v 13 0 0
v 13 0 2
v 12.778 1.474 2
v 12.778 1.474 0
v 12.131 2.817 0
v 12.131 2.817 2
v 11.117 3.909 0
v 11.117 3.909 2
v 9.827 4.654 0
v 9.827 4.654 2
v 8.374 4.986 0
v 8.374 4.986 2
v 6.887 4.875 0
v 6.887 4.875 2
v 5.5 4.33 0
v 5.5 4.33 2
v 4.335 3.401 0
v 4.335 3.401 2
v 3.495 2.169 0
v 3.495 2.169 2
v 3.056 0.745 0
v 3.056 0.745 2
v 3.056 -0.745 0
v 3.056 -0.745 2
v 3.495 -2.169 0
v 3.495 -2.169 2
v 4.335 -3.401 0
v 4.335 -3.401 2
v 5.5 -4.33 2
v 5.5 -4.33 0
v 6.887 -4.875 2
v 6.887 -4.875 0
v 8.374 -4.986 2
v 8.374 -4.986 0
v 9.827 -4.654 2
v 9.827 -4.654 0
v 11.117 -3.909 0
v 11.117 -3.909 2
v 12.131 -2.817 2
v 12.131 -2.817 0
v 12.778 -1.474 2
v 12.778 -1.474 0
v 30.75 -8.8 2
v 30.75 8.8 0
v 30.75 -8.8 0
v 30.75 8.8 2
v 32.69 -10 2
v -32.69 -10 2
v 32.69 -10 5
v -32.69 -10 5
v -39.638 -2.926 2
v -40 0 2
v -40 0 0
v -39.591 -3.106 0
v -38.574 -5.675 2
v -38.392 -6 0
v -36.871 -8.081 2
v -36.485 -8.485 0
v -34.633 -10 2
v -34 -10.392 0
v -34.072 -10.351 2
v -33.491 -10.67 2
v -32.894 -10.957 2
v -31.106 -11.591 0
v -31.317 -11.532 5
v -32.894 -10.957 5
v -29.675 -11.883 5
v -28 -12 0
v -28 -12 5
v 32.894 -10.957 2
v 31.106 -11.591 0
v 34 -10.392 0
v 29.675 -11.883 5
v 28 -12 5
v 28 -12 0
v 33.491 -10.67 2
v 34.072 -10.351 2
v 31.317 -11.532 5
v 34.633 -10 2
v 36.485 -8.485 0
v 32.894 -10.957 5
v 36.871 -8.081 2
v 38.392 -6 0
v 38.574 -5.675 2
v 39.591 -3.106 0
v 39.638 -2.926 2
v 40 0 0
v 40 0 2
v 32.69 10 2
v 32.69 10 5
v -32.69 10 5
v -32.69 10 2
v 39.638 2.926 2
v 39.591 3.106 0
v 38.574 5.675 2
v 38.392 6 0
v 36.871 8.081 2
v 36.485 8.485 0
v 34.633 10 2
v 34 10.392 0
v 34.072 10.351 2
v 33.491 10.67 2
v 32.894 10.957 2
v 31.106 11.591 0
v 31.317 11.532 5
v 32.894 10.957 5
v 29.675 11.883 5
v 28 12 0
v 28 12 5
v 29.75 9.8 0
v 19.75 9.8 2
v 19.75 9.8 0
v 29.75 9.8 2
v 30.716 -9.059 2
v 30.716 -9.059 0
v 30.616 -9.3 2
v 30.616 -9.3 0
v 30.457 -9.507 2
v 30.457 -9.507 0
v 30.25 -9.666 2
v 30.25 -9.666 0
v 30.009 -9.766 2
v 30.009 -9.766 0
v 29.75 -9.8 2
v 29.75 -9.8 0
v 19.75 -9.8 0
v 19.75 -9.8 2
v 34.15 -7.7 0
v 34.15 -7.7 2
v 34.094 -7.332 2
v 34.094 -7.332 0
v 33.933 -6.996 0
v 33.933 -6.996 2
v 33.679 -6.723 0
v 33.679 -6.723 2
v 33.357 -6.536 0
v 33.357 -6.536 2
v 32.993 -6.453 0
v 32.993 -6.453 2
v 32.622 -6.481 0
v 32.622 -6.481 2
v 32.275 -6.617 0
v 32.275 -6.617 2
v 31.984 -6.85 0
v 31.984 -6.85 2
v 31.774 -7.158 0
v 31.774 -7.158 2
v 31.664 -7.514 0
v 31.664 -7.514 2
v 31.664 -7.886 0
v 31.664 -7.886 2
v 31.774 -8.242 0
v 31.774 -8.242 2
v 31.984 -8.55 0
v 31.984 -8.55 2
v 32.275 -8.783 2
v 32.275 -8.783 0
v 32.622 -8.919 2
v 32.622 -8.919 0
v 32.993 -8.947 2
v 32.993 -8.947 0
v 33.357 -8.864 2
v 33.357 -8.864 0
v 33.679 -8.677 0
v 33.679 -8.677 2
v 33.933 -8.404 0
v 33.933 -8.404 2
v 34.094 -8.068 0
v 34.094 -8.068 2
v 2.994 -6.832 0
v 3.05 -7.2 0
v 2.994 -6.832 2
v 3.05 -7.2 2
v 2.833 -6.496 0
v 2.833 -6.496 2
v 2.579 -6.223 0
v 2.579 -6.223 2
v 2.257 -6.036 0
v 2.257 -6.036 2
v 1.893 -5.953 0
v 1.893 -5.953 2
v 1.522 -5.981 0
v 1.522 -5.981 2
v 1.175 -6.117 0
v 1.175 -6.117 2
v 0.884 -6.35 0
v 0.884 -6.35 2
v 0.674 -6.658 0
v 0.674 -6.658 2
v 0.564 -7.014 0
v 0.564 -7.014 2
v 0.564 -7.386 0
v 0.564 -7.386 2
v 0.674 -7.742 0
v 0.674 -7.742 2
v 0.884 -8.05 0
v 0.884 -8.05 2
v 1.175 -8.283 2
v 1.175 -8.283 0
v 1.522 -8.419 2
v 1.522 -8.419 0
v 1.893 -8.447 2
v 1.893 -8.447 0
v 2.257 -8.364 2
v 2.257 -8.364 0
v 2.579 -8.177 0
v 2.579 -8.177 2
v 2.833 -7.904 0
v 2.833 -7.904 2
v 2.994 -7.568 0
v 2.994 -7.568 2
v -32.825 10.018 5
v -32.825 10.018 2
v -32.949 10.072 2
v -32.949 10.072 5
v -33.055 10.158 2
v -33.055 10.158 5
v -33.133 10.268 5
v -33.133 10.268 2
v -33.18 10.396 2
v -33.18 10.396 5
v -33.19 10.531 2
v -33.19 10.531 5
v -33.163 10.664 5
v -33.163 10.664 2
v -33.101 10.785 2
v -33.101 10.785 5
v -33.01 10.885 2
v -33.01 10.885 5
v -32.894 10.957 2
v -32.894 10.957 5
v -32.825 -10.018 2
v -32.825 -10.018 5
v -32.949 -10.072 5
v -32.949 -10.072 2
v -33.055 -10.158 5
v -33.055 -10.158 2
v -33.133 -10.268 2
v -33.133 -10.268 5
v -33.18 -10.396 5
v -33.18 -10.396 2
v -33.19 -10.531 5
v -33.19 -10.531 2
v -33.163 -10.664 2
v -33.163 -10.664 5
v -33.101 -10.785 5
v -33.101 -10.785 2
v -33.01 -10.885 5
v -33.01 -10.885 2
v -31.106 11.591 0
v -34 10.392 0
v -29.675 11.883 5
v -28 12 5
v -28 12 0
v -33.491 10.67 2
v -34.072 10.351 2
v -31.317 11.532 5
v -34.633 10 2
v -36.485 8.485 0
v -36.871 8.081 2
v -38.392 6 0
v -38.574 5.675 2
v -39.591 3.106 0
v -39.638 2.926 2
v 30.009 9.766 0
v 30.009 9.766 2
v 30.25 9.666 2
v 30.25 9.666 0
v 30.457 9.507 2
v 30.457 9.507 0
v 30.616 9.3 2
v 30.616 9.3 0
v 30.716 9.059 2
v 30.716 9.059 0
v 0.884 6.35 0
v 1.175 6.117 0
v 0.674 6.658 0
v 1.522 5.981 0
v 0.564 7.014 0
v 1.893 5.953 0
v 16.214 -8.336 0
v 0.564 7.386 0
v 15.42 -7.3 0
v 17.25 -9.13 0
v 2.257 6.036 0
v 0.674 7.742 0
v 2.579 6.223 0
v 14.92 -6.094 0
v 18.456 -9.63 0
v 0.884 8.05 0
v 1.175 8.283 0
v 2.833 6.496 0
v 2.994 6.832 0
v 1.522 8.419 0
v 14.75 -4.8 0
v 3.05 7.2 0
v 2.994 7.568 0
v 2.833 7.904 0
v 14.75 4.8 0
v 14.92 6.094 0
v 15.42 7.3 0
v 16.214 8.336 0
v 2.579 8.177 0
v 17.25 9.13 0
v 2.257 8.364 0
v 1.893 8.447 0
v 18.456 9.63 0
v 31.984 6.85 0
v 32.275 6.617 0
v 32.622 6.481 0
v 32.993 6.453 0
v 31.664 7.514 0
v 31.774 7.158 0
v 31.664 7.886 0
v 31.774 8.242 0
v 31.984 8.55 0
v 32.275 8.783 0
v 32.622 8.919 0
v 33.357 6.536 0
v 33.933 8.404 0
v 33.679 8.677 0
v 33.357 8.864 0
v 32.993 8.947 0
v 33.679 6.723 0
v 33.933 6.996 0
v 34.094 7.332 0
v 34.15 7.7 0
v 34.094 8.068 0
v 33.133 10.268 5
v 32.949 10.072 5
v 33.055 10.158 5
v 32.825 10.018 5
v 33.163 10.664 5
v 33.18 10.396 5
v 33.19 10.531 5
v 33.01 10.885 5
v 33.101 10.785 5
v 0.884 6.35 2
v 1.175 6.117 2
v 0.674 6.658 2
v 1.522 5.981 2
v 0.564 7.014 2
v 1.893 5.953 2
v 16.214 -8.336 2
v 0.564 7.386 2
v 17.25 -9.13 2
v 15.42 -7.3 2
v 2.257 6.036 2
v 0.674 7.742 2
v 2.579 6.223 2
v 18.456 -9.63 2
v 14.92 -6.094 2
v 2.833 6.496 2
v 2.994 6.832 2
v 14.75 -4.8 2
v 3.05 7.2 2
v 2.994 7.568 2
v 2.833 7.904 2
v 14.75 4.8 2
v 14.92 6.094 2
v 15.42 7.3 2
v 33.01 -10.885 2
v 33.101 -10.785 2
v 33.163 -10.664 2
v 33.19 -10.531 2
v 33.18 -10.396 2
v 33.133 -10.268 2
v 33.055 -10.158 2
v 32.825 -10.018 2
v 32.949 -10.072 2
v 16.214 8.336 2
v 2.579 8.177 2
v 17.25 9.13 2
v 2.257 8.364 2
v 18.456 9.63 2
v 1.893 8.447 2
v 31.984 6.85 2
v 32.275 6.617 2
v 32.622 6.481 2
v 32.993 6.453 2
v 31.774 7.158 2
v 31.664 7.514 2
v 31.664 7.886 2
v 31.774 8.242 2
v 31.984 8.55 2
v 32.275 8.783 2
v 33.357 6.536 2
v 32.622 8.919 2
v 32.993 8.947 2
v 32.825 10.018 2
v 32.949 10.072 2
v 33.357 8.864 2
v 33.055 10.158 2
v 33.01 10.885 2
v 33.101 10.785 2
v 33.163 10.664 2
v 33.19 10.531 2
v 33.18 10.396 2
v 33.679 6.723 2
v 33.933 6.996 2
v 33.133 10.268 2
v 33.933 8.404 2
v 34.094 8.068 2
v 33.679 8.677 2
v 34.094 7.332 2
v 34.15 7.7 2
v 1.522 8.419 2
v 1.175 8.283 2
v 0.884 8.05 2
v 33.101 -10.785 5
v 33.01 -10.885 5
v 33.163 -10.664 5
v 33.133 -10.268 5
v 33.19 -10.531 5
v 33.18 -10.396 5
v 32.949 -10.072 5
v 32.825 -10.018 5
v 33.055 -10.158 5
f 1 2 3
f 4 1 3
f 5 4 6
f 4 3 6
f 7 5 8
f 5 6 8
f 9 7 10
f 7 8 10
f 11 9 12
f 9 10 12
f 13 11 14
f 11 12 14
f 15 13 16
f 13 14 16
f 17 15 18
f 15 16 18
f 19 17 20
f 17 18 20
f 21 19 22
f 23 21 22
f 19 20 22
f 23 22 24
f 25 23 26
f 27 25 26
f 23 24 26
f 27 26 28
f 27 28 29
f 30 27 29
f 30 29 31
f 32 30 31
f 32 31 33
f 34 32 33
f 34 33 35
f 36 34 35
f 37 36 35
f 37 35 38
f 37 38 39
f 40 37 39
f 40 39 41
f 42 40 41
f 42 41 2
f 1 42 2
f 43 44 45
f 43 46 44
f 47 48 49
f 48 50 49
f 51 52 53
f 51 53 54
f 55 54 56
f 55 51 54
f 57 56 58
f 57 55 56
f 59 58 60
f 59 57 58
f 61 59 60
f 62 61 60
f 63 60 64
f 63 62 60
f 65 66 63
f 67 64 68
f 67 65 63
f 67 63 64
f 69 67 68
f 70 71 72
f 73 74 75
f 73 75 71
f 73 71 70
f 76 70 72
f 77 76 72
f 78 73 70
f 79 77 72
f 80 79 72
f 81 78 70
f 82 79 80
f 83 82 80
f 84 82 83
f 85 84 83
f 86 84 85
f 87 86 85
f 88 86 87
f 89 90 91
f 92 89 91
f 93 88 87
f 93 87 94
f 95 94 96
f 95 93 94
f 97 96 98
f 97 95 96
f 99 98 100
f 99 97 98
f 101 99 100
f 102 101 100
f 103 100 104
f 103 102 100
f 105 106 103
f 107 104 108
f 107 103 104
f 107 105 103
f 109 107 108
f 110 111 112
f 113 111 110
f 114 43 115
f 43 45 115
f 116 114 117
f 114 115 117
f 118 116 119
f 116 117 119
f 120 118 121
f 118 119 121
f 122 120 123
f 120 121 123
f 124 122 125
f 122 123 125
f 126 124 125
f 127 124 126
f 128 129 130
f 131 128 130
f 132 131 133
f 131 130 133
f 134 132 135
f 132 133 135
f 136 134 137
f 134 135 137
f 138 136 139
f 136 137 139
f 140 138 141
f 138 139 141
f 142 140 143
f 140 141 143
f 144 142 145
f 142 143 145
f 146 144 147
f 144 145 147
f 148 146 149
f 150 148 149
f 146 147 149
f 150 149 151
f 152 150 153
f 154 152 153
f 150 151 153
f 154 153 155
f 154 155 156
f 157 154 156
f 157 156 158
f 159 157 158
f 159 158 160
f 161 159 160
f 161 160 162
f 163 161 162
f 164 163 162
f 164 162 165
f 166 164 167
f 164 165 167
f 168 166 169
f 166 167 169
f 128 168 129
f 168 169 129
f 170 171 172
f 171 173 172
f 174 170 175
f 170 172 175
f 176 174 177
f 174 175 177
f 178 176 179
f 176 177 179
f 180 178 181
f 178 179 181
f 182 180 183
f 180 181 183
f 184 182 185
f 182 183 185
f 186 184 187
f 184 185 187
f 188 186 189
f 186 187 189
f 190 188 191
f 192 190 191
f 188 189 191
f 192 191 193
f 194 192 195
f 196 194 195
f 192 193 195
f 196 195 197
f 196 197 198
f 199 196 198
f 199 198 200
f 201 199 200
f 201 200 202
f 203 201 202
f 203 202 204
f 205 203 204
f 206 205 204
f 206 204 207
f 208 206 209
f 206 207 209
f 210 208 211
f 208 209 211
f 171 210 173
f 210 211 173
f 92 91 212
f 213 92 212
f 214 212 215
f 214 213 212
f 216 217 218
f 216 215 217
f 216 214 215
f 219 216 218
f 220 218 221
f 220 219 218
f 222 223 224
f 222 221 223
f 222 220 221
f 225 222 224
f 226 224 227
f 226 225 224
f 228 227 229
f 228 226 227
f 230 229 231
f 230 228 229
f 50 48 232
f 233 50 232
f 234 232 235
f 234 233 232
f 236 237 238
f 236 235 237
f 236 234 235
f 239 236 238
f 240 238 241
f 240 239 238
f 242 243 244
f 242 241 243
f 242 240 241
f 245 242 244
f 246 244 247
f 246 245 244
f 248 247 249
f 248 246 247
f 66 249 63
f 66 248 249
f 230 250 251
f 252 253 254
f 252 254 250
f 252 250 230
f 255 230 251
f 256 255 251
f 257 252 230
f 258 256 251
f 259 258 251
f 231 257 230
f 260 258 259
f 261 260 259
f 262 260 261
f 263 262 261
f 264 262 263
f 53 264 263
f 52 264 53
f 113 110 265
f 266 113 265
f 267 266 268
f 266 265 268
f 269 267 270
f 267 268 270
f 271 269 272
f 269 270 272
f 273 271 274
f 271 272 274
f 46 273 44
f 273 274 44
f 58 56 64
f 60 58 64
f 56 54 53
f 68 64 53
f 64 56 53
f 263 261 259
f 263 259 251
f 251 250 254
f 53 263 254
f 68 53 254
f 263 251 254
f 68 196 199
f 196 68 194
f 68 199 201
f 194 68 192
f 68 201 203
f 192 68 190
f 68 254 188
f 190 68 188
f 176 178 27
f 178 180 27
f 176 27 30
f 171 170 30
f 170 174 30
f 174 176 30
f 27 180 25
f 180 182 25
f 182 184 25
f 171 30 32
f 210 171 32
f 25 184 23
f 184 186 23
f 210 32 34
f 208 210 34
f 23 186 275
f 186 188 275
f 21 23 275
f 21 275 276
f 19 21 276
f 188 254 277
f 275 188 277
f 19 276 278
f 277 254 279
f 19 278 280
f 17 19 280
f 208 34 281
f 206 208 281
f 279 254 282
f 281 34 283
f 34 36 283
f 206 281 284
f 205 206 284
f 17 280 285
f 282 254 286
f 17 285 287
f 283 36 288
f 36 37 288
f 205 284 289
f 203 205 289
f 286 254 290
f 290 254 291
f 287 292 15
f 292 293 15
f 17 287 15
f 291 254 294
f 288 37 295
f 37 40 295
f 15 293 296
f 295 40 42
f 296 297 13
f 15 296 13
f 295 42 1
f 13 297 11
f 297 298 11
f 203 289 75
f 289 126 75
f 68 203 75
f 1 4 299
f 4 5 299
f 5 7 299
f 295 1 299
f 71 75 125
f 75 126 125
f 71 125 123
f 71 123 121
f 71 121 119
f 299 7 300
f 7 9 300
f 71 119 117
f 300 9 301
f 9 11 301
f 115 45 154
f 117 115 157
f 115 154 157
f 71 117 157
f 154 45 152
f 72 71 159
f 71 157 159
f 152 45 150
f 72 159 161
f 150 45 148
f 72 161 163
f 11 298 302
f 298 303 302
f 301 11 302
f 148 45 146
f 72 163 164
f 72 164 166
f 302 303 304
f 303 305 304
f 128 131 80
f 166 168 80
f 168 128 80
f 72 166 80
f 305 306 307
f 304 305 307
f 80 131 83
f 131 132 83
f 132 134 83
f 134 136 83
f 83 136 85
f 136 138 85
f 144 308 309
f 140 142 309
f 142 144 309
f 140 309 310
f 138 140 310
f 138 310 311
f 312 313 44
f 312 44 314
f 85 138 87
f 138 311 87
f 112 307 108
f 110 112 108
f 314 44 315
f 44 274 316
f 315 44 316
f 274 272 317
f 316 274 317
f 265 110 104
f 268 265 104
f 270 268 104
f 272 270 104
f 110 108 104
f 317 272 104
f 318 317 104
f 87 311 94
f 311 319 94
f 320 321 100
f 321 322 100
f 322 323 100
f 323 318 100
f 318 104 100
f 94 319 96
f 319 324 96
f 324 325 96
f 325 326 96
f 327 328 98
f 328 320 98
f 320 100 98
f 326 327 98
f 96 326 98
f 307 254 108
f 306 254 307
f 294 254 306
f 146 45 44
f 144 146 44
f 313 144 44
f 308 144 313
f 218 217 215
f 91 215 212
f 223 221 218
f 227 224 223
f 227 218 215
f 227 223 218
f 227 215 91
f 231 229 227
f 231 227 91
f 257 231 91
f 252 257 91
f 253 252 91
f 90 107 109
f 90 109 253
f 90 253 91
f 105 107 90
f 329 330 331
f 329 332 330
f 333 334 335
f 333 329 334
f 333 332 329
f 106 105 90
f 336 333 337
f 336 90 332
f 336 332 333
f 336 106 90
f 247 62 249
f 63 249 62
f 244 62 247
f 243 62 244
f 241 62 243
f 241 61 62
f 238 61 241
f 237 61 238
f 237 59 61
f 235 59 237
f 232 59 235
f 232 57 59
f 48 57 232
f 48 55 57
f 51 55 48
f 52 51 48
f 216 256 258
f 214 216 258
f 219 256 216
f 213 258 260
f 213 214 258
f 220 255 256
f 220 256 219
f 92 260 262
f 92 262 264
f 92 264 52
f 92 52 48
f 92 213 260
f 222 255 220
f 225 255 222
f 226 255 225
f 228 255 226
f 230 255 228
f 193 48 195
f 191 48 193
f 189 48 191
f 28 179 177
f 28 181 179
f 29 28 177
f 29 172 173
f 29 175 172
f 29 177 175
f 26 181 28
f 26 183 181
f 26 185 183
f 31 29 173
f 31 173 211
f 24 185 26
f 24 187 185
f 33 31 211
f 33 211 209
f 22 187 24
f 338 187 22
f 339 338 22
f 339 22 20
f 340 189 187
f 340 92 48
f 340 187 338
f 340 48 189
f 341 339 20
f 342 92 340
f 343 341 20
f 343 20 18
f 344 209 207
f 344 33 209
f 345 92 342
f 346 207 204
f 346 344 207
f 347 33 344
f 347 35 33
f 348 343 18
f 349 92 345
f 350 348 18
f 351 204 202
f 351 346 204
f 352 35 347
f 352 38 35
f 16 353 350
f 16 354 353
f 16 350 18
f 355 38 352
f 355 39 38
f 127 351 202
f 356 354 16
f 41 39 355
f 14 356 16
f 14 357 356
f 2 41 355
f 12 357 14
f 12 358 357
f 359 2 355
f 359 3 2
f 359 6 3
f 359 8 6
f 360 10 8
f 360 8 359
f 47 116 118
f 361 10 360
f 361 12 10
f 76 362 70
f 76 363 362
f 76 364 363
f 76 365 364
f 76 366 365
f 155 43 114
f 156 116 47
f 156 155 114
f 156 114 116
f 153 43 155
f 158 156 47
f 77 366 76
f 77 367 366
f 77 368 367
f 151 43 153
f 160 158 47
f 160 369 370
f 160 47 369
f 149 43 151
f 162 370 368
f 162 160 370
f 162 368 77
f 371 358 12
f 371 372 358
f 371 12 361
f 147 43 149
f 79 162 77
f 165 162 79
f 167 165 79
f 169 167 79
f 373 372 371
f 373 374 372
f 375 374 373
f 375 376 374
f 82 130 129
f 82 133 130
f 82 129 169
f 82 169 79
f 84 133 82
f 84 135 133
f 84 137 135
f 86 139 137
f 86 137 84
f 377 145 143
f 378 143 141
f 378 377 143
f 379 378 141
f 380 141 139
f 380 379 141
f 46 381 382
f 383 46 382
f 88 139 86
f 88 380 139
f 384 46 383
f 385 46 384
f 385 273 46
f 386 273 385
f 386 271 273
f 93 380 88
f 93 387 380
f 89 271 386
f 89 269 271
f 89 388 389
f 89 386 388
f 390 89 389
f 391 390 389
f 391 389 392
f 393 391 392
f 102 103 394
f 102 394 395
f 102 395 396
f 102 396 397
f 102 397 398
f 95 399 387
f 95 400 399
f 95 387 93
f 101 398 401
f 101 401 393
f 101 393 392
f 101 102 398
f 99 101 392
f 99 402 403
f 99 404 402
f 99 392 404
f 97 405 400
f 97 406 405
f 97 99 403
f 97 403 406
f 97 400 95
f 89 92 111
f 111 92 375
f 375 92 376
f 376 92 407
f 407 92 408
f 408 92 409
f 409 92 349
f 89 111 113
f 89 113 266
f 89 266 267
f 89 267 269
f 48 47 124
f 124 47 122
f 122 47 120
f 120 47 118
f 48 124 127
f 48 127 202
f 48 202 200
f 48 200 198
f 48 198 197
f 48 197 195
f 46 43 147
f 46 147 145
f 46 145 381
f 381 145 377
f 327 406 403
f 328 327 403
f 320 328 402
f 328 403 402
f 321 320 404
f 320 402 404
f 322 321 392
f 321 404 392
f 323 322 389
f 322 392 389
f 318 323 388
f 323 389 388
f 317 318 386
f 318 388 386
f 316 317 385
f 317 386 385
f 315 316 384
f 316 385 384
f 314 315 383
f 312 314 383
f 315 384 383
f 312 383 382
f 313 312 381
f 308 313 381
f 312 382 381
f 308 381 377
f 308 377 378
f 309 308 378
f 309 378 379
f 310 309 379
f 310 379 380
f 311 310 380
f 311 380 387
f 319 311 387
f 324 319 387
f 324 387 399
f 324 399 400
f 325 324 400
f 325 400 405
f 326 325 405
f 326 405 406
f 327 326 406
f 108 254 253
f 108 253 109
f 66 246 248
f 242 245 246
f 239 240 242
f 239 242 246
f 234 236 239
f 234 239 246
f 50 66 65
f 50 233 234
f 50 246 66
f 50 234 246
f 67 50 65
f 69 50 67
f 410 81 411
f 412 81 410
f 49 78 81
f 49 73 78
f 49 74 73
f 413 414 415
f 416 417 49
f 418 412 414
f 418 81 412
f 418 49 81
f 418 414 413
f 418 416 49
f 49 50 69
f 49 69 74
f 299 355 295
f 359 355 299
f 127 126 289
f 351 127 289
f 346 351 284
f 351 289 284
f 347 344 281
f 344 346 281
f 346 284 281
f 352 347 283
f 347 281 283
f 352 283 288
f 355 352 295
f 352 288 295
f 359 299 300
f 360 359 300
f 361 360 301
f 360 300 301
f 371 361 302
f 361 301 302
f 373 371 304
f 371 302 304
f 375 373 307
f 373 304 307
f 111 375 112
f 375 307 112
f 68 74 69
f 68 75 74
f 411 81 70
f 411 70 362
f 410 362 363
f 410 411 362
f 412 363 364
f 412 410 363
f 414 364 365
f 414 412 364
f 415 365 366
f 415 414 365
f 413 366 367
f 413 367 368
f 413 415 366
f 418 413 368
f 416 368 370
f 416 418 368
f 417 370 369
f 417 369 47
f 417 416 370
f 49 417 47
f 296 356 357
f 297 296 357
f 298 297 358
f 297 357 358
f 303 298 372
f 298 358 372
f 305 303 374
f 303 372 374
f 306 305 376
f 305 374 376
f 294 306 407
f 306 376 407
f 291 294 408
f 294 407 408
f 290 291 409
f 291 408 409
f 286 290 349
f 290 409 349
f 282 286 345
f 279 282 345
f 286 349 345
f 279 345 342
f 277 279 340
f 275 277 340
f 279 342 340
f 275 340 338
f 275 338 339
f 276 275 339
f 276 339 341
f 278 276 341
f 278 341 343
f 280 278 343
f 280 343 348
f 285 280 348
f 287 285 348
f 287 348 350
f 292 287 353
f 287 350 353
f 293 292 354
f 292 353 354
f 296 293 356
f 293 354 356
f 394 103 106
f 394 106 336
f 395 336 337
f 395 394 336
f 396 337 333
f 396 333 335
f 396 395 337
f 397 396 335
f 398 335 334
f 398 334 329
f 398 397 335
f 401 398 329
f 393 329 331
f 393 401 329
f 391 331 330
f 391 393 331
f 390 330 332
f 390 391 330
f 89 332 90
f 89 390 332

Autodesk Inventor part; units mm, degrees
ref_plane "YZ Plane" through (0, 0, 0) normal (1, 0, 0) x (0, 1, 0)
ref_plane "XZ Plane" through (0, 0, 0) normal (0, 1, 0) x (-1, 0, 0)
ref_plane "XY Plane" through (0, 0, 0) normal (0, 0, 1) x (1, 0, 0)
sketch "スケッチ1" plane through (0, 0, 0) normal (0, 0, 1) x (1, 0, 0)
  line L0 (-40, 12) -> (40, 12)
  line L1 (40, 12) -> (40, -12)
  line L2 (40, -12) -> (-40, -12)
  line L3 (-40, -12) -> (-40, 12)
  point P0 (0, 0)
  dimension "d0" = 80
  dimension "d1" = 24
  dimension "d2" = 12
  dimension "d3" = 40
extrude "押し出し1" add sketch "スケッチ1" along normal blind 5
sketch "スケッチ2" plane through (0, 0, 5) normal (0, 0, 1) x (1, 0, 0)
  line L0 (-0.8, 9.8) -> (35, 9.8)
  line L1 (35, 9.8) -> (35, -9.8)
  line L2 (35, -9.8) -> (-0.8, -9.8)
  line L3 (-0.8, -9.8) -> (-0.8, 9.8)
  line L4 (35, 9.8) -> (30.75, 9.8)
  line L5 (30.75, 9.8) -> (30.75, -9.8)
  line L6 (30.75, -9.8) -> (35, -9.8)
  line L7 (35, -9.8) -> (35, 9.8)
  line L8 (30.75, -9.8) -> (14.75, -9.8)
  line L9 (14.75, -9.8) -> (14.75, 9.8)
  line L10 (14.75, 9.8) -> (30.75, 9.8)
  line L11 (30.75, 9.8) -> (30.75, -9.8)
  circle A0 centre (8, 0) radius 5
  line L12 (35, 0) -> (-0.8, 0)
  circle A1 centre (1.8, 7.2) radius 1.25
  circle A2 centre (32.9, 7.7) radius 1.25
  circle A3 centre (1.8, -7.2) radius 1.25
  circle A4 centre (32.9, -7.7) radius 1.25
  line L13 (40, 12) -> (40, -12) projected
  point P0 (0, 0)
  dimension "d6" = 35.8
  dimension "d7" = 19.6
  dimension "d8" = 9.8
  dimension "d10" = 4.25
  dimension "d11" = 16
  dimension "d12" = 10
  dimension "d13" = 27
  dimension "d14" = 14.4
  dimension "d15" = 15.4
  dimension "d16" = 31.1
  dimension "d17" = 2.1
  dimension "d18" = 2.5
  dimension "d19" = 2.5
  dimension "d47" = 5
extrude "押し出し2" cut sketch "スケッチ2" against normal through all contours L0 L5 L12 L9 | L12 L5 L2 L9 | L12 A0 | A0 L12 | A1 | A2 | A3 | A4
fillet "フィレット1" radius 5 2 edges at (14.75, 9.8, 2.5) (14.75, -9.8, 2.5)
fillet "フィレット2" radius 1 2 edges at (30.75, 9.8, 2.5) (30.75, -9.8, 2.5)
sketch "スケッチ5" plane through (0, 0, 5) normal (0, 0, 1) x (1, 0, 0)
  line L0 (40, 12) -> (40, -12) projected
  line L1 (29.75, -9.8) -> (19.75, -9.8) projected
  arc A0 (14.75, -4.8) -> (19.75, -9.8) centre (19.75, -4.8) ccw projected
  line L2 (14.75, -4.8) -> (14.75, 4.8) projected
  arc A1 (19.75, 9.8) -> (14.75, 4.8) centre (19.75, 4.8) ccw projected
  line L3 (19.75, 9.8) -> (29.75, 9.8) projected
  arc A2 (30.75, 8.8) -> (29.75, 9.8) centre (29.75, 8.8) ccw projected
  line L4 (30.75, 8.8) -> (30.75, -8.8) projected
  arc A3 (29.75, -9.8) -> (30.75, -8.8) centre (29.75, -8.8) ccw projected
  circle A4 centre (32.9, -7.7) radius 1.25 projected
  circle A5 centre (1.8, -7.2) radius 1.25 projected
  circle A6 centre (32.9, 7.7) radius 1.25 projected
  circle A7 centre (1.8, 7.2) radius 1.25 projected
  circle A8 centre (8, 0) radius 5 projected
  line L5 (40, 10) -> (-40, 10)
  line L6 (-40, 10) -> (-40, -10)
  line L7 (-40, -10) -> (40, -10)
  line L8 (40, -10) -> (40, 10)
  point P0 (-32.5, 14.4762)
  point P1 (-32.5, -14.4762)
  point P2 (0, 0)
  dimension "d41" = 20
  dimension "d42" = 10
  dimension "d49" = 41.8
extrude "押し出し4" cut sketch "スケッチ5" against normal blind 3
fillet "フィレット3" radius 12 4 edges at (40, -12, 2.5) (40, 12, 2.5) (-40, -12, 2.5) (-40, 12, 2.5)
fillet "フィレット4" radius 0.5 4 edges at (-34.6333, -10, 3.5) (-34.6333, 10, 3.5) (34.6333, 10, 3.5) (34.6333, -10, 3.5)
equation "\"d2\" = 0.5 * d1"
equation "\"d3\" = 0.5 * d0"
equation "\"d8\" = 0.5 * d7"
equation "\"d42\" = 0.5 * d41"
properties part number "JointC2"
